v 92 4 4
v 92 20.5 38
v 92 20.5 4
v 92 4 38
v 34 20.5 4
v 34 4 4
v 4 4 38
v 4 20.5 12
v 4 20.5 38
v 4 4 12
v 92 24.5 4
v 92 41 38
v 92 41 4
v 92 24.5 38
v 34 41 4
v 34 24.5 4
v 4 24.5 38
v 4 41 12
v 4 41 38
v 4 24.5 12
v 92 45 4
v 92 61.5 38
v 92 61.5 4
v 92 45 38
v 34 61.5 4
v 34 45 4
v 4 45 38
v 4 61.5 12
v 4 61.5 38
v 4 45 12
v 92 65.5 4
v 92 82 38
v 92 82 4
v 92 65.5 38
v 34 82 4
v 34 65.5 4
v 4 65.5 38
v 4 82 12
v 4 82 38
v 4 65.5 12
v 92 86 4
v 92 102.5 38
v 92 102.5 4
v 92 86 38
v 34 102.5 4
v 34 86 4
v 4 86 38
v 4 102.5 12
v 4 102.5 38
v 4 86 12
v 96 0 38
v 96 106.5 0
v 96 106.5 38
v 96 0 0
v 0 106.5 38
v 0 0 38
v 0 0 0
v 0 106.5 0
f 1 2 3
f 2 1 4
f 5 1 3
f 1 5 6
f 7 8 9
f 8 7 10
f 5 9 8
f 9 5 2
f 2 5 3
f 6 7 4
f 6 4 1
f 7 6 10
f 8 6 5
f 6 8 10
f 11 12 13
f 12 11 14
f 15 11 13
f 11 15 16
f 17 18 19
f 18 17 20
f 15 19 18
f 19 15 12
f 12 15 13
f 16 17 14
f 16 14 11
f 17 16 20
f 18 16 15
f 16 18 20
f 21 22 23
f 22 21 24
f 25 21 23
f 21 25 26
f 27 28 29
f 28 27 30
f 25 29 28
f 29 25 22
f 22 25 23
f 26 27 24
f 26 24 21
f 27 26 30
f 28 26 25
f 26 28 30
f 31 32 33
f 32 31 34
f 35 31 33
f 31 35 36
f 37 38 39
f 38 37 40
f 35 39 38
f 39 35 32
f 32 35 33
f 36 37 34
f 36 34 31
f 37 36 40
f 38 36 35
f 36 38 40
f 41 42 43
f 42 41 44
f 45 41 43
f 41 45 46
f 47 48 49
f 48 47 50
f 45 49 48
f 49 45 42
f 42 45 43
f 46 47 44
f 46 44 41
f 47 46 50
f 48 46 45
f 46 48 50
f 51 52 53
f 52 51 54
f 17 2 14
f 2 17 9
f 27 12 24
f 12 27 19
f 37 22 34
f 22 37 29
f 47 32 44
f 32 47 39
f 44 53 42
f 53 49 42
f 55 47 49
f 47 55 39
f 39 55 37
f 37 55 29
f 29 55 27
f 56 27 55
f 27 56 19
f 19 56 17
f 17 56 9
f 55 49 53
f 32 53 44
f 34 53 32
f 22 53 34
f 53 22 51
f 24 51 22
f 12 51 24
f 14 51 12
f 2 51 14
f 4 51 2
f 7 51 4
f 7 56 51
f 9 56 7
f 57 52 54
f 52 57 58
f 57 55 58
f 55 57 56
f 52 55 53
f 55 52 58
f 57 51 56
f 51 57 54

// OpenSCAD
// label tape holder
// by ido roseman, 2015

// variable description
number_of_tapes = 5; // [1:10]
wall_width = 4; // [3:5]

//cartridge size
cx = +88;
cy = +16.5;
cz = +68;



module Cartridge ()
{
    difference()
    {
        cube([cx,cy,cz]);
        translate([0, cy, 0])
          rotate([90, 0, 0]) 
            linear_extrude(height=cy)
              polygon([[0,0],[0,8],[30,0]]);
    }
}


difference()
{
    cube([cx+2*wall_width, number_of_tapes*(cy+wall_width)+wall_width, (cz/2)+wall_width]);
    for (i=[0:number_of_tapes-1])
        translate([wall_width,i*(cy+wall_width)+wall_width,wall_width])
            Cartridge();
}
